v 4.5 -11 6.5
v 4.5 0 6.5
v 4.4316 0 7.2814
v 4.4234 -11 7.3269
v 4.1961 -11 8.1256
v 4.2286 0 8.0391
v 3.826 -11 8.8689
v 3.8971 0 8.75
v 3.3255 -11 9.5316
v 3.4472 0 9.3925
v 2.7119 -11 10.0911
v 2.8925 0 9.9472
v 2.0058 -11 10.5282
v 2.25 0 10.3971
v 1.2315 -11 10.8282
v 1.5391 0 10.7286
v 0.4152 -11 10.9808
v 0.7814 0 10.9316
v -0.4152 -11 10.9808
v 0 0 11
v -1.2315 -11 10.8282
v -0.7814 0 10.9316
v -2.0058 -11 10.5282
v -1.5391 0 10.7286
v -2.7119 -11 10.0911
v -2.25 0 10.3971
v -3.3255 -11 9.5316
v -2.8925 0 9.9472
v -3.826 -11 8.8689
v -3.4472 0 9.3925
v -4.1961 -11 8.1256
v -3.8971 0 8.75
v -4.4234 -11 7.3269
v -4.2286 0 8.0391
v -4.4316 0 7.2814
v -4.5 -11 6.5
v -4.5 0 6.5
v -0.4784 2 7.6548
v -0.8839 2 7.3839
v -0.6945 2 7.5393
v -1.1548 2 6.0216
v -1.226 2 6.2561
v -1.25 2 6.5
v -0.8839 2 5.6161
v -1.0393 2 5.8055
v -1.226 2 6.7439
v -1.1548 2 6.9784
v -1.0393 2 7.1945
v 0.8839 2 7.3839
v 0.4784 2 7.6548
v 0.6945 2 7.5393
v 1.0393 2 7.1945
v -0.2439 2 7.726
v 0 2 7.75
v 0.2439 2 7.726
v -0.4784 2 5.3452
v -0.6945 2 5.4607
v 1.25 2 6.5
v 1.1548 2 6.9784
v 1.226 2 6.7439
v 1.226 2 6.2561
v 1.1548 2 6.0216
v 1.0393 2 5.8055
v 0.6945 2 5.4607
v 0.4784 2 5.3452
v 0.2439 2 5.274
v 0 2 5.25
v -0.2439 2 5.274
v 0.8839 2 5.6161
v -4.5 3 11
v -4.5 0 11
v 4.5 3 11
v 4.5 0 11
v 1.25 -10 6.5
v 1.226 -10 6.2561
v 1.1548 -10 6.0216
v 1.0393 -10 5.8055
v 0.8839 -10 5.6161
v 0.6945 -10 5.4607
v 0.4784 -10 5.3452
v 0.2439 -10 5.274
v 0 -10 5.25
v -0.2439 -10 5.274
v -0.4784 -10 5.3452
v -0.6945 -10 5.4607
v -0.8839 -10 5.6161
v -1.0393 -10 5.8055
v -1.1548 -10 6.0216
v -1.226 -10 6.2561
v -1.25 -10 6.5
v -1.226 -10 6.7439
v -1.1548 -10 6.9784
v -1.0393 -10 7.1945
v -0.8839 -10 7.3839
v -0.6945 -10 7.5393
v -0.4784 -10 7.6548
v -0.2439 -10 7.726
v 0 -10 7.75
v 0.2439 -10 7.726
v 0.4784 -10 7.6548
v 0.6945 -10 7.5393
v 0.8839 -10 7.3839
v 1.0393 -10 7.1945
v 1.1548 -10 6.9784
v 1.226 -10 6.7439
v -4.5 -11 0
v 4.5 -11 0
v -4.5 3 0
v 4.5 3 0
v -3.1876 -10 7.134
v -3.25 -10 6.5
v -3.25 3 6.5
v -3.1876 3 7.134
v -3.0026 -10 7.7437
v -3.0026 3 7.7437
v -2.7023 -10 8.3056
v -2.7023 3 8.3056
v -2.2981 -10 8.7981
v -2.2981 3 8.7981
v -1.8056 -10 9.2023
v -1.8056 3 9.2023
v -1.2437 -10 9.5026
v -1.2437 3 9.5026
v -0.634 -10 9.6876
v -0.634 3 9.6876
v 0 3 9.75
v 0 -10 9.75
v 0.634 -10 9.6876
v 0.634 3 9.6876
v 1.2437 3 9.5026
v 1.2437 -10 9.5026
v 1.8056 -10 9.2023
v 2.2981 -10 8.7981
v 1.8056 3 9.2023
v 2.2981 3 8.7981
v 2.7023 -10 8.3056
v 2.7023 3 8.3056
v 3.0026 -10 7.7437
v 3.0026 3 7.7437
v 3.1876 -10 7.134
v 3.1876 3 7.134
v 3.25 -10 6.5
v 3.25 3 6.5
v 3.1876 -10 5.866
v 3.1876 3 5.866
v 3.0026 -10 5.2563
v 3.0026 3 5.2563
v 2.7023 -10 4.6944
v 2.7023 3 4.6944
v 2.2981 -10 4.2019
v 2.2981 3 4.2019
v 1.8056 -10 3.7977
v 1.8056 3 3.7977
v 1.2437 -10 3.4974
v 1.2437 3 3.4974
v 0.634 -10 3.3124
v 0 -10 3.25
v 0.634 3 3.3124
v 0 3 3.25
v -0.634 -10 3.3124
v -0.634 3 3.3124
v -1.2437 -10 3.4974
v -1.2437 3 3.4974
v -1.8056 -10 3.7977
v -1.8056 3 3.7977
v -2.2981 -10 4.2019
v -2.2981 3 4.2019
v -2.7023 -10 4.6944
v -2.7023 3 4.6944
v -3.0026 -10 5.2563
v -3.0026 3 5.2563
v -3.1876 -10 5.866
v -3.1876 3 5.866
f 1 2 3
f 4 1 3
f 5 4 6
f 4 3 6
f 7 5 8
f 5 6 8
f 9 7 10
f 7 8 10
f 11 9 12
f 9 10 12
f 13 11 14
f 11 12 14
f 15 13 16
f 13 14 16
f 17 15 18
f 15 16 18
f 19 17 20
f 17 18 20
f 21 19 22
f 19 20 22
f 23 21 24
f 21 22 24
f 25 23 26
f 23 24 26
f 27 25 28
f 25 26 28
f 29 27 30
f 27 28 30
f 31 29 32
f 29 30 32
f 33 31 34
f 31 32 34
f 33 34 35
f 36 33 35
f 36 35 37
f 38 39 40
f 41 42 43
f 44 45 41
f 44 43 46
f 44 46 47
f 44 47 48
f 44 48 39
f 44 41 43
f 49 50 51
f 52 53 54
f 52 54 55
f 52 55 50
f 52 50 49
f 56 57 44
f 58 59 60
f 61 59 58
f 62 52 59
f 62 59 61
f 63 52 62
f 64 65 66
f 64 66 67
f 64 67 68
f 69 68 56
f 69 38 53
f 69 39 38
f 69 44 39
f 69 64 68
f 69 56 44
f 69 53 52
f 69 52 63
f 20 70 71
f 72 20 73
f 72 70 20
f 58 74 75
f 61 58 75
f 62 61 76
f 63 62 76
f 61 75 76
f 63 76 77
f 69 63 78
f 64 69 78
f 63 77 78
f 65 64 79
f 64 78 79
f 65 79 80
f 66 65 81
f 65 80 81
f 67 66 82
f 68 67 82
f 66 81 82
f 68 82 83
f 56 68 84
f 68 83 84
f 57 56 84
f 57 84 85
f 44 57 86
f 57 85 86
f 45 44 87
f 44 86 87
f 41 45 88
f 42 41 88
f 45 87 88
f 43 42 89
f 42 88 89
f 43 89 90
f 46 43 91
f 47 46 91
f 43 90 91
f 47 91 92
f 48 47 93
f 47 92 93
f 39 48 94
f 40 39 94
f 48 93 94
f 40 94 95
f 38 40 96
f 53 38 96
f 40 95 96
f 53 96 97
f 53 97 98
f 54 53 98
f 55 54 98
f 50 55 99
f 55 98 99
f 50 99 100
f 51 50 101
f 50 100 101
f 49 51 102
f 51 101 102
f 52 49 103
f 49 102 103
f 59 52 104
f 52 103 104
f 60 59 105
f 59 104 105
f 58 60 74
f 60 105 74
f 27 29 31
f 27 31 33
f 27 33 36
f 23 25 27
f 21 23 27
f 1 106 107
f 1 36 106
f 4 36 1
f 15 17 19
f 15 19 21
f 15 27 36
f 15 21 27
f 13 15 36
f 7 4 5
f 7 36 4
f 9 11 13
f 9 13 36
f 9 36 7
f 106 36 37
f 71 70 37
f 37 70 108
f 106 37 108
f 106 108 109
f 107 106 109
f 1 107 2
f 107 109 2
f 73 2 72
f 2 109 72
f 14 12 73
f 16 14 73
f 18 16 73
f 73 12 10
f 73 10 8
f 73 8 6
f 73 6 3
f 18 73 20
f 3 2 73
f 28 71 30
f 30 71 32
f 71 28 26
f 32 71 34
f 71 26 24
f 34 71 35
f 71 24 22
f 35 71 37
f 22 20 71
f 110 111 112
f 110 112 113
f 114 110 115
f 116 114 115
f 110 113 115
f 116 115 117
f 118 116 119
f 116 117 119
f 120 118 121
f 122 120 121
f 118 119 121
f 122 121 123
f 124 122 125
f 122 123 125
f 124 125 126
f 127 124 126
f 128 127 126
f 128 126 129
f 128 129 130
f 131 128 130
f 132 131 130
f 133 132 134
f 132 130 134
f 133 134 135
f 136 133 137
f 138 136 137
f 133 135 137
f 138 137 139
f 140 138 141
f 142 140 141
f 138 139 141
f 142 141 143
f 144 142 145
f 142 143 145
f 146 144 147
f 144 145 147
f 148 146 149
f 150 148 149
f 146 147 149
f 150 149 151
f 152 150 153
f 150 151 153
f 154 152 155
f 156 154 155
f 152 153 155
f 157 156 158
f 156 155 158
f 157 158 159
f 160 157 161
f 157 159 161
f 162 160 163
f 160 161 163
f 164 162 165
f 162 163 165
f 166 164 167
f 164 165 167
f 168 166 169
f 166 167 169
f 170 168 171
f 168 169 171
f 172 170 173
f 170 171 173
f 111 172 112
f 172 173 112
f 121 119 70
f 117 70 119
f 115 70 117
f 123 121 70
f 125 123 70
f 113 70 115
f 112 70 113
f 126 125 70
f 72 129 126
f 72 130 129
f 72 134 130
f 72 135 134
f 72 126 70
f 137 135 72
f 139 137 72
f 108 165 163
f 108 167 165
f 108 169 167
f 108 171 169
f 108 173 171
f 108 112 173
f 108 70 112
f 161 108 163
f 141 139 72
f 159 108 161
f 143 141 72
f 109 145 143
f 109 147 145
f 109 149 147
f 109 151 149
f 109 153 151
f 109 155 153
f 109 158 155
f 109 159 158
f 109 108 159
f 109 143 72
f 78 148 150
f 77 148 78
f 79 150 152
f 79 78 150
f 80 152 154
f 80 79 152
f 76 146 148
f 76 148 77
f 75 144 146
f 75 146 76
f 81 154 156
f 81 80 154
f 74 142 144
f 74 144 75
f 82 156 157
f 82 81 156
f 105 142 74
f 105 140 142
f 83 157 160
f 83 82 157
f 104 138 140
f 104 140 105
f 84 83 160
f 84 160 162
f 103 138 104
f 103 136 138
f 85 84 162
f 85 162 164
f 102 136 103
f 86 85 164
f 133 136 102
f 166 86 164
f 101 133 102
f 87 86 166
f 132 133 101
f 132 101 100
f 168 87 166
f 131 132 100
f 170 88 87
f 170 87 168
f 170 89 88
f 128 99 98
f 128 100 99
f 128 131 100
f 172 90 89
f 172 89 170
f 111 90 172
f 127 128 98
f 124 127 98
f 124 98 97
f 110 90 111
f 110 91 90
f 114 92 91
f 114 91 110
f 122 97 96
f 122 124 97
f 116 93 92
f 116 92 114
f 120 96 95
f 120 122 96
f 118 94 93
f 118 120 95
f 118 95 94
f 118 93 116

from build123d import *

# Parameters (mm, degrees)
SKETCH1_W           = 9
SKETCH1_H           = 3
BOSS_EXTRUDE1_DEPTH = 11
BOSS_EXTRUDE2_DEPTH = 11
SKETCH3_R           = 3.25
CUT_EXTRUDE1_DEPTH  = 13
SKETCH4_R           = 1.25
BOSS_EXTRUDE3_DEPTH = 12


with BuildPart() as part:
    # Sketch1 → Boss-Extrude1 (new body)
    with BuildSketch(Plane.XY):
        with Locations((0, 1.5)):
            Rectangle(SKETCH1_W, SKETCH1_H)
    extrude(amount=BOSS_EXTRUDE1_DEPTH)

    # Sketch2 → Boss-Extrude2 (add)
    with BuildSketch(Plane.XZ):
        with BuildLine():
            Line((-4.5, 0), (4.5, 0))
            Line((4.5, 0), (4.5, 6.5))
            ThreePointArc((4.5, 6.5), (0, 11), (-4.5, 6.5))
            Line((-4.5, 6.5), (-4.5, 0))
        make_face()
    extrude(amount=BOSS_EXTRUDE2_DEPTH)

    # Sketch3 → Cut-Extrude1 (cut)
    with BuildSketch(Plane(origin=(0, 3, 0), x_dir=(1, 0, 0), z_dir=(0, 1, 0))):
        with Locations(Location((0, -6.5, 0), (0, 0, 180))):
            Circle(SKETCH3_R)
    extrude(amount=-CUT_EXTRUDE1_DEPTH, mode=Mode.SUBTRACT)

    # Sketch4 → Boss-Extrude3 (add)
    with BuildSketch(Plane(origin=(0, -10, 0), x_dir=(1, 0, 0), z_dir=(0, 1, 0))):
        with Locations((0, -6.5)):
            Circle(SKETCH4_R)
    extrude(amount=BOSS_EXTRUDE3_DEPTH)


solid = part.part
